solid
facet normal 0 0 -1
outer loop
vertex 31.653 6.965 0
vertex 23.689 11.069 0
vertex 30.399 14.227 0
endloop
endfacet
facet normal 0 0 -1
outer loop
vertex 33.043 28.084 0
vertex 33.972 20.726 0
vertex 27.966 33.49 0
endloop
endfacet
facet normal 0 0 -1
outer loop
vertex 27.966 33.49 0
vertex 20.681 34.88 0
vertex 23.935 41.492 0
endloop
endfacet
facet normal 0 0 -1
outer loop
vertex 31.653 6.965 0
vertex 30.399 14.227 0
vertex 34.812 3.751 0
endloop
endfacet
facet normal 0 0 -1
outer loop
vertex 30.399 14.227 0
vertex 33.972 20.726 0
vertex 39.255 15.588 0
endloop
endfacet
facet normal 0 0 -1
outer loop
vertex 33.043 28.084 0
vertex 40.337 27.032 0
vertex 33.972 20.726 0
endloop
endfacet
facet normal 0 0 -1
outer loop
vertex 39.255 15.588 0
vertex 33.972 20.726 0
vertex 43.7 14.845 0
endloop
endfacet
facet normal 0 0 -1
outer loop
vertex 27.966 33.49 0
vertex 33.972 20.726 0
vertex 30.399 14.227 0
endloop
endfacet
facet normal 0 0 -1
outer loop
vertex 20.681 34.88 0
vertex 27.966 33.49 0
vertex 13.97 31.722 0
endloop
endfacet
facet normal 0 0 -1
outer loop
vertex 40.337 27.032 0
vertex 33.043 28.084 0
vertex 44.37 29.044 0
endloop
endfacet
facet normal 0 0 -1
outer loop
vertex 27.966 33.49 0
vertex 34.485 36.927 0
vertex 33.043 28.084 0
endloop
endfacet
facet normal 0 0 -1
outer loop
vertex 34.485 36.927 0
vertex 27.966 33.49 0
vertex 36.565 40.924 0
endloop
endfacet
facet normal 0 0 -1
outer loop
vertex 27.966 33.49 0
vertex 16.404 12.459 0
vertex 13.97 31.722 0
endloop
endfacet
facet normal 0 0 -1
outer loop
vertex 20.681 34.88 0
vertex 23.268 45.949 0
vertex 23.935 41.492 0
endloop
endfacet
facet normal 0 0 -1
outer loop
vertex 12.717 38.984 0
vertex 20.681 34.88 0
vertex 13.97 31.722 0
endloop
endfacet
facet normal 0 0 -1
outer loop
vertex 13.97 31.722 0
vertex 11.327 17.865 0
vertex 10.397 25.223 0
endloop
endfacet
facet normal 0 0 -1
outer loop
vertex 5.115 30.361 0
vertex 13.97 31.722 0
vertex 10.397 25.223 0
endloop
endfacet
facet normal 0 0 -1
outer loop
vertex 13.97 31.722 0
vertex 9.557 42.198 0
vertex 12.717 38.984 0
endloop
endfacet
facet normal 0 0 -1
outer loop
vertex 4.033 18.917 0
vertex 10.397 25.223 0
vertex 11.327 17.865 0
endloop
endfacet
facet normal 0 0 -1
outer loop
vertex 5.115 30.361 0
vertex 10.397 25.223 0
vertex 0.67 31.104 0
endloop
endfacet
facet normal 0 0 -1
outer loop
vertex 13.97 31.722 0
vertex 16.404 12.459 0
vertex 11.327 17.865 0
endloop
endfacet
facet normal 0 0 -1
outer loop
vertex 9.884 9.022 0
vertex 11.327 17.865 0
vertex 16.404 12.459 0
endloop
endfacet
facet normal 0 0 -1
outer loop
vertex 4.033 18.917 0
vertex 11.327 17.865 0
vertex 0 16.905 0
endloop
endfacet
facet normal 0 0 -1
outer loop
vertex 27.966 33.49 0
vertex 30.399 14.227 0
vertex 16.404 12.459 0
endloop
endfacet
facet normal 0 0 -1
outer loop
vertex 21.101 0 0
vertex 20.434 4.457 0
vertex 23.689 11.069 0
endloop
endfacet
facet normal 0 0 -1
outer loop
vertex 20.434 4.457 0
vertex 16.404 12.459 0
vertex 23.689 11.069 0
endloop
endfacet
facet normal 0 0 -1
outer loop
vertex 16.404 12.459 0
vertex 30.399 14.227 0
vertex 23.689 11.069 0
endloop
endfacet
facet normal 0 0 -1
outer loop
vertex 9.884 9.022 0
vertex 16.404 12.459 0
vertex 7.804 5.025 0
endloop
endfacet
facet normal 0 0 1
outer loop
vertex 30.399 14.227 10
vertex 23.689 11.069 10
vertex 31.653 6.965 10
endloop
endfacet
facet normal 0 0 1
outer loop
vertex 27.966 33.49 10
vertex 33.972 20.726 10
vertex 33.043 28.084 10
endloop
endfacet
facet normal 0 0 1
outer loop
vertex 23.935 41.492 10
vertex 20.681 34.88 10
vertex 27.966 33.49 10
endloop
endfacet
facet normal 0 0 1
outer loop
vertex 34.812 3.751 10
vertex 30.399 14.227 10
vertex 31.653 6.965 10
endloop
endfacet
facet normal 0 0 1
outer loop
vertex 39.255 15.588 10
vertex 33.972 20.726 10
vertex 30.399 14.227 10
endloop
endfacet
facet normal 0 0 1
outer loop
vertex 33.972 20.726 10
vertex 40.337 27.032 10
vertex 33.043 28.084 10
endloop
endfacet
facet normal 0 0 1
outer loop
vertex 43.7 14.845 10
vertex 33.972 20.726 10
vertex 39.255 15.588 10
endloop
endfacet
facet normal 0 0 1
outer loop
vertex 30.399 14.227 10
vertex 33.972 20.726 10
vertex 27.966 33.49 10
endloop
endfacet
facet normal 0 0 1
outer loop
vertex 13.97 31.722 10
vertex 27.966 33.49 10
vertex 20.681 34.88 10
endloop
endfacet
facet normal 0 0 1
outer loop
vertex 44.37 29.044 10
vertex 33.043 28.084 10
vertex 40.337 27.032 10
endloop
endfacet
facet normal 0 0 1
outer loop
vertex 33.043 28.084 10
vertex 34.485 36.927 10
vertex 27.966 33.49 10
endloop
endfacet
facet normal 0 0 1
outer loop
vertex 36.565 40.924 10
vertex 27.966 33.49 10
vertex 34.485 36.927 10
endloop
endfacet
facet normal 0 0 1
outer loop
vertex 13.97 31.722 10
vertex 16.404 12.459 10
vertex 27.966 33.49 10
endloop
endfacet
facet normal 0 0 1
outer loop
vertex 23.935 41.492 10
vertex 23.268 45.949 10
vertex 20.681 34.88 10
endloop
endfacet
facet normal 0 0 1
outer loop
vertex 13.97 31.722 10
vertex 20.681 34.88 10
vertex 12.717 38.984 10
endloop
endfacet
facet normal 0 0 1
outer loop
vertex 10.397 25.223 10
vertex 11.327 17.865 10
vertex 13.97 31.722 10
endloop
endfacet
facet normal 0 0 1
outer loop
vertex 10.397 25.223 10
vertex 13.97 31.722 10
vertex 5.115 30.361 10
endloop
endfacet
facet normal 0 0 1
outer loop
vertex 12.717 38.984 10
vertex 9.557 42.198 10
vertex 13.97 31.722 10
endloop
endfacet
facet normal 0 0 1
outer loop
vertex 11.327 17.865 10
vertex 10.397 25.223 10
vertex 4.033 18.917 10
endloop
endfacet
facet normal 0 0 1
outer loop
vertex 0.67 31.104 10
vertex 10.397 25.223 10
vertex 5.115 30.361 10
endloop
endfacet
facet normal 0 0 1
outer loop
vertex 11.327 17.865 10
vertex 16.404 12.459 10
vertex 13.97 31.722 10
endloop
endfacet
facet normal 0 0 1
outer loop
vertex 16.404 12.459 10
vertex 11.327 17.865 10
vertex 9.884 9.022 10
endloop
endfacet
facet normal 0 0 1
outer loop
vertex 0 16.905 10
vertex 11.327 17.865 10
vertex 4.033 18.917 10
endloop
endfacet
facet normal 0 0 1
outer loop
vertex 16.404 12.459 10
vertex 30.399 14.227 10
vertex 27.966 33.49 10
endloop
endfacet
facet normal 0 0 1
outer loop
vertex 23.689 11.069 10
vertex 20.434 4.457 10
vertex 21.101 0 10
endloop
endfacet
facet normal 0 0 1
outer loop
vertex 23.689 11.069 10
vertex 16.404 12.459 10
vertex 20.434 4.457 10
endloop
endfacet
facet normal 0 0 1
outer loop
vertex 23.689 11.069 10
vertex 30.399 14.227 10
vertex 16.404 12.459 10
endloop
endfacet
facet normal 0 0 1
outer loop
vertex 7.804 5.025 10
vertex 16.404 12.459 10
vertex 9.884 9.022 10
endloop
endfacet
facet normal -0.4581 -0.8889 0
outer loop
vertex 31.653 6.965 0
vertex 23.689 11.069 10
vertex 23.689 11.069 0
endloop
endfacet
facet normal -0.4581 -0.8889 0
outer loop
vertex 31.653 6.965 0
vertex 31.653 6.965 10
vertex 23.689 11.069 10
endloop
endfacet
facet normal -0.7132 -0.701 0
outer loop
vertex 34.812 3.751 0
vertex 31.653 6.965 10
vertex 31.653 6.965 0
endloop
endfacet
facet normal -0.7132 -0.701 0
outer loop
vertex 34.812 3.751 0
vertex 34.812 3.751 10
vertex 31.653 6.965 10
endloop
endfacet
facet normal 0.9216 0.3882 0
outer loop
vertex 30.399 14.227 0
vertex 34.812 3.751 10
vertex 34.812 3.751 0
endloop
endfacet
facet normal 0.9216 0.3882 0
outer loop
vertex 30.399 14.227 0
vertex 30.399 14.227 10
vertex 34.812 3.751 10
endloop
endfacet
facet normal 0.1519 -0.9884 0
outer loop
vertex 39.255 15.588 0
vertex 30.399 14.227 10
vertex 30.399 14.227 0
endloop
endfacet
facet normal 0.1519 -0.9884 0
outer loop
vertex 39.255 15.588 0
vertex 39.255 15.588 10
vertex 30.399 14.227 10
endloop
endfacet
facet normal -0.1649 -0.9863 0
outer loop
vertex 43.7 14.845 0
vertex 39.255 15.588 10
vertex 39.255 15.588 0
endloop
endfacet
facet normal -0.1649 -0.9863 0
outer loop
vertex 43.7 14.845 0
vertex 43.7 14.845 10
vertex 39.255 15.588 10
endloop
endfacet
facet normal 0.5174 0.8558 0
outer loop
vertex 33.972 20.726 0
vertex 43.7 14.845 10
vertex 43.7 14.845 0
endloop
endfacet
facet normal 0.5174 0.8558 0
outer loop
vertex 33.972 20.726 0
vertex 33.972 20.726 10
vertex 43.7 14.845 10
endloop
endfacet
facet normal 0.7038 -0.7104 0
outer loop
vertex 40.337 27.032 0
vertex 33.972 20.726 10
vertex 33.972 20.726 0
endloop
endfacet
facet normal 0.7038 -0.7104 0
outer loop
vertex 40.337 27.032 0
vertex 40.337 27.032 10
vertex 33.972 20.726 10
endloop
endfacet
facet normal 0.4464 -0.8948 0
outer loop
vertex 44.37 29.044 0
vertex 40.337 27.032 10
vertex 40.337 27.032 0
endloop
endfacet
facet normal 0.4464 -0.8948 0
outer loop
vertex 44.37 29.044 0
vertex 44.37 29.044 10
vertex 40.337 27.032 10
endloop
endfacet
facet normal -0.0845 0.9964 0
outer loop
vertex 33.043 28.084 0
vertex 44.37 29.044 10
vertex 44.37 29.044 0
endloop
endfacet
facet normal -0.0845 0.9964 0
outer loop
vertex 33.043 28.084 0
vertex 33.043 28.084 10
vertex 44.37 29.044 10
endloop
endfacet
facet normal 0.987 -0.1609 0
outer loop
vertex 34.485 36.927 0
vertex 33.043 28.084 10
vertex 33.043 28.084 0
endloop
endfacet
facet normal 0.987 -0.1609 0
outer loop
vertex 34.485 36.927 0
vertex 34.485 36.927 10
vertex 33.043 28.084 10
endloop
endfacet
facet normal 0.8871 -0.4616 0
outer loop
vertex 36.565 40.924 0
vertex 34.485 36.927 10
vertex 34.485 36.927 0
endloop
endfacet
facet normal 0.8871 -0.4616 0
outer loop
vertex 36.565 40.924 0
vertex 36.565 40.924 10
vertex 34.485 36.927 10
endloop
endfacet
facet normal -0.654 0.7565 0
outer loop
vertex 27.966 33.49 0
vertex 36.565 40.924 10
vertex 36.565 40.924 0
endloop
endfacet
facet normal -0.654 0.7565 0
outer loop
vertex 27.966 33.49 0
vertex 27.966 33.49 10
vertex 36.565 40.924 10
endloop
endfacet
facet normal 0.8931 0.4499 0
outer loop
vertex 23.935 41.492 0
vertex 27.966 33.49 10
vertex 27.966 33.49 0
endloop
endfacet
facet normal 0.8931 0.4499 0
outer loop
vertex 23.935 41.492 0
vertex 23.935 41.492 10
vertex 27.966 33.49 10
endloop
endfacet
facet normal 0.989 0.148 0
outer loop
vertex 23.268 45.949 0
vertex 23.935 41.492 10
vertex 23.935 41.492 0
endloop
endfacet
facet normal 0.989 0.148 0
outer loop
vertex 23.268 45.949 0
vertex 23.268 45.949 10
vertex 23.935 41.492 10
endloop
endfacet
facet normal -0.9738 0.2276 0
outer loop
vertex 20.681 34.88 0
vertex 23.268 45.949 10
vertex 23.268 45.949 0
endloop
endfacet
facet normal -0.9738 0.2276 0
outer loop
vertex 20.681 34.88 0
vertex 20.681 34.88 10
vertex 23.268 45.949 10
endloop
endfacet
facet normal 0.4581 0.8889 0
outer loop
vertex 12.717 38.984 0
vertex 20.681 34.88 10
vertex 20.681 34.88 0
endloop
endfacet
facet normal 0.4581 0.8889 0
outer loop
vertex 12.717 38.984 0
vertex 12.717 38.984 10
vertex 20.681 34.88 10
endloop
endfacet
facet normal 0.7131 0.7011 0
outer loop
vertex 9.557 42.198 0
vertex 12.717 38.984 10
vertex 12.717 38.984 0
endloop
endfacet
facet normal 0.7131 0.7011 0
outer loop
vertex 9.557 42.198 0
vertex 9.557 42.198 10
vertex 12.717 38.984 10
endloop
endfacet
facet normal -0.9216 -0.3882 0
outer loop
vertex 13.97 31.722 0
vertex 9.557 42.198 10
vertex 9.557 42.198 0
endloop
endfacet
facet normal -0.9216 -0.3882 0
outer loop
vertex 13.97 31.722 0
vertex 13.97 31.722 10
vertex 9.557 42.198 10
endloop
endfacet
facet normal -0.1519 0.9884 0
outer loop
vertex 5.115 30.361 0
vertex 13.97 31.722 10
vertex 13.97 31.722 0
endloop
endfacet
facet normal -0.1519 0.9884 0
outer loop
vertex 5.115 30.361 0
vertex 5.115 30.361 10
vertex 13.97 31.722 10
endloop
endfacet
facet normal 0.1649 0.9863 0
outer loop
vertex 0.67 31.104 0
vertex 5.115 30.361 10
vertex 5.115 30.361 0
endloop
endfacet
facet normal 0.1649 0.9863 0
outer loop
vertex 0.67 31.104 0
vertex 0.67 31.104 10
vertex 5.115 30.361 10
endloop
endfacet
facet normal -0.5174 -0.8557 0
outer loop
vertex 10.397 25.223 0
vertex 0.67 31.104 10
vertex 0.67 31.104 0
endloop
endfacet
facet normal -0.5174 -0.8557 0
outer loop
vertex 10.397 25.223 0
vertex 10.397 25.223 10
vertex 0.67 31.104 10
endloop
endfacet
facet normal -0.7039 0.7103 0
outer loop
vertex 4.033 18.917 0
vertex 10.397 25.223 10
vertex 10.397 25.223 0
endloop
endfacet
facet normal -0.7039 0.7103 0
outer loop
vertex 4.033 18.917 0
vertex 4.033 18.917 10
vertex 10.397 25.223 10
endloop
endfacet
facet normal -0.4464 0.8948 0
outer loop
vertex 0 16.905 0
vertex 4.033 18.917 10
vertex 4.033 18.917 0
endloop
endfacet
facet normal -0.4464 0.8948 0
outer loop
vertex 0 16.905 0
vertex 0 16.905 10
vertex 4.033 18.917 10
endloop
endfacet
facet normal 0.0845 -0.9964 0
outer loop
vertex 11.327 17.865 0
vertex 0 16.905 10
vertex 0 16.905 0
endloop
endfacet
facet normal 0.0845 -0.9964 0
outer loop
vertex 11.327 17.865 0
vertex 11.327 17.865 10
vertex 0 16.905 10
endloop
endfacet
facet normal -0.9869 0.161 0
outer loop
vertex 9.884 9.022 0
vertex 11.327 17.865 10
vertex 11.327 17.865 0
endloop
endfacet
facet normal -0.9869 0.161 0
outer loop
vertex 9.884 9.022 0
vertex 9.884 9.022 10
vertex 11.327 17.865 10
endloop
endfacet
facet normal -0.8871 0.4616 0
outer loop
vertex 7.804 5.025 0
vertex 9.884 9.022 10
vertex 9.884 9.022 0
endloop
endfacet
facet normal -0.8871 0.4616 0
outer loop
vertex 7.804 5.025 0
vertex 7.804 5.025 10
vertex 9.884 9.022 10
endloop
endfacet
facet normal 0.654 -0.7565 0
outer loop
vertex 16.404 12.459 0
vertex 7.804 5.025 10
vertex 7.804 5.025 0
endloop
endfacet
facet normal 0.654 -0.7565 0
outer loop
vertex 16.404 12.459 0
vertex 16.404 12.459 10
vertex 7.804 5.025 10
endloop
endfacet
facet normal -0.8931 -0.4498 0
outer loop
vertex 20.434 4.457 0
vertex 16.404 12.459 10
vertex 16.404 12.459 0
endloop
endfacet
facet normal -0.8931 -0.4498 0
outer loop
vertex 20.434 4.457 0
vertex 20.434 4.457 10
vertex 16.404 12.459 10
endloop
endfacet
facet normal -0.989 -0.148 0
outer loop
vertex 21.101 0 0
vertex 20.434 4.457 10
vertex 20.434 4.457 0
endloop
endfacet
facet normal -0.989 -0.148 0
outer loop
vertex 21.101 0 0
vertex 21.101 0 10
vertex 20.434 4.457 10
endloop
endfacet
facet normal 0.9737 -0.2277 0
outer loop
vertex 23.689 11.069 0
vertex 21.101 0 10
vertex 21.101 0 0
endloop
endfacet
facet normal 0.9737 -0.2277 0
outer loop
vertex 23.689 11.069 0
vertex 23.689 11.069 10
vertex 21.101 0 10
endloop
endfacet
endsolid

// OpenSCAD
$fn = 32;

// ----------------------------------------------------------------------
// Fan rotor section: 10 blades, 12 mm hub radius, 11 mm blades
// ----------------------------------------------------------------------

// --- parameters (mm) ---
profile_height = 10;      // extrusion height
profile_points = 30;      // points of the closed outline

profile = [[33.972, 20.726], [40.337, 27.032], [44.37, 29.044], [33.043, 28.084], [34.485, 36.927], [36.565, 40.924], [27.966, 33.49], [23.935, 41.492], [23.268, 45.949], [20.681, 34.88], [12.717, 38.984], [9.557, 42.198], [13.97, 31.722], [5.115, 30.361], [0.67, 31.104], [10.397, 25.223], [4.033, 18.917], [0, 16.905], [11.327, 17.865], [9.884, 9.022], [7.804, 5.025], [16.404, 12.459], [20.434, 4.457], [21.101, 0], [23.689, 11.069], [31.653, 6.965], [34.812, 3.751], [30.399, 14.227], [39.255, 15.588], [43.7, 14.845]];  // single closed polygon, 30 points, counter clockwise

// --- the one profile operation ---
linear_extrude(height = profile_height) polygon(points = profile);
